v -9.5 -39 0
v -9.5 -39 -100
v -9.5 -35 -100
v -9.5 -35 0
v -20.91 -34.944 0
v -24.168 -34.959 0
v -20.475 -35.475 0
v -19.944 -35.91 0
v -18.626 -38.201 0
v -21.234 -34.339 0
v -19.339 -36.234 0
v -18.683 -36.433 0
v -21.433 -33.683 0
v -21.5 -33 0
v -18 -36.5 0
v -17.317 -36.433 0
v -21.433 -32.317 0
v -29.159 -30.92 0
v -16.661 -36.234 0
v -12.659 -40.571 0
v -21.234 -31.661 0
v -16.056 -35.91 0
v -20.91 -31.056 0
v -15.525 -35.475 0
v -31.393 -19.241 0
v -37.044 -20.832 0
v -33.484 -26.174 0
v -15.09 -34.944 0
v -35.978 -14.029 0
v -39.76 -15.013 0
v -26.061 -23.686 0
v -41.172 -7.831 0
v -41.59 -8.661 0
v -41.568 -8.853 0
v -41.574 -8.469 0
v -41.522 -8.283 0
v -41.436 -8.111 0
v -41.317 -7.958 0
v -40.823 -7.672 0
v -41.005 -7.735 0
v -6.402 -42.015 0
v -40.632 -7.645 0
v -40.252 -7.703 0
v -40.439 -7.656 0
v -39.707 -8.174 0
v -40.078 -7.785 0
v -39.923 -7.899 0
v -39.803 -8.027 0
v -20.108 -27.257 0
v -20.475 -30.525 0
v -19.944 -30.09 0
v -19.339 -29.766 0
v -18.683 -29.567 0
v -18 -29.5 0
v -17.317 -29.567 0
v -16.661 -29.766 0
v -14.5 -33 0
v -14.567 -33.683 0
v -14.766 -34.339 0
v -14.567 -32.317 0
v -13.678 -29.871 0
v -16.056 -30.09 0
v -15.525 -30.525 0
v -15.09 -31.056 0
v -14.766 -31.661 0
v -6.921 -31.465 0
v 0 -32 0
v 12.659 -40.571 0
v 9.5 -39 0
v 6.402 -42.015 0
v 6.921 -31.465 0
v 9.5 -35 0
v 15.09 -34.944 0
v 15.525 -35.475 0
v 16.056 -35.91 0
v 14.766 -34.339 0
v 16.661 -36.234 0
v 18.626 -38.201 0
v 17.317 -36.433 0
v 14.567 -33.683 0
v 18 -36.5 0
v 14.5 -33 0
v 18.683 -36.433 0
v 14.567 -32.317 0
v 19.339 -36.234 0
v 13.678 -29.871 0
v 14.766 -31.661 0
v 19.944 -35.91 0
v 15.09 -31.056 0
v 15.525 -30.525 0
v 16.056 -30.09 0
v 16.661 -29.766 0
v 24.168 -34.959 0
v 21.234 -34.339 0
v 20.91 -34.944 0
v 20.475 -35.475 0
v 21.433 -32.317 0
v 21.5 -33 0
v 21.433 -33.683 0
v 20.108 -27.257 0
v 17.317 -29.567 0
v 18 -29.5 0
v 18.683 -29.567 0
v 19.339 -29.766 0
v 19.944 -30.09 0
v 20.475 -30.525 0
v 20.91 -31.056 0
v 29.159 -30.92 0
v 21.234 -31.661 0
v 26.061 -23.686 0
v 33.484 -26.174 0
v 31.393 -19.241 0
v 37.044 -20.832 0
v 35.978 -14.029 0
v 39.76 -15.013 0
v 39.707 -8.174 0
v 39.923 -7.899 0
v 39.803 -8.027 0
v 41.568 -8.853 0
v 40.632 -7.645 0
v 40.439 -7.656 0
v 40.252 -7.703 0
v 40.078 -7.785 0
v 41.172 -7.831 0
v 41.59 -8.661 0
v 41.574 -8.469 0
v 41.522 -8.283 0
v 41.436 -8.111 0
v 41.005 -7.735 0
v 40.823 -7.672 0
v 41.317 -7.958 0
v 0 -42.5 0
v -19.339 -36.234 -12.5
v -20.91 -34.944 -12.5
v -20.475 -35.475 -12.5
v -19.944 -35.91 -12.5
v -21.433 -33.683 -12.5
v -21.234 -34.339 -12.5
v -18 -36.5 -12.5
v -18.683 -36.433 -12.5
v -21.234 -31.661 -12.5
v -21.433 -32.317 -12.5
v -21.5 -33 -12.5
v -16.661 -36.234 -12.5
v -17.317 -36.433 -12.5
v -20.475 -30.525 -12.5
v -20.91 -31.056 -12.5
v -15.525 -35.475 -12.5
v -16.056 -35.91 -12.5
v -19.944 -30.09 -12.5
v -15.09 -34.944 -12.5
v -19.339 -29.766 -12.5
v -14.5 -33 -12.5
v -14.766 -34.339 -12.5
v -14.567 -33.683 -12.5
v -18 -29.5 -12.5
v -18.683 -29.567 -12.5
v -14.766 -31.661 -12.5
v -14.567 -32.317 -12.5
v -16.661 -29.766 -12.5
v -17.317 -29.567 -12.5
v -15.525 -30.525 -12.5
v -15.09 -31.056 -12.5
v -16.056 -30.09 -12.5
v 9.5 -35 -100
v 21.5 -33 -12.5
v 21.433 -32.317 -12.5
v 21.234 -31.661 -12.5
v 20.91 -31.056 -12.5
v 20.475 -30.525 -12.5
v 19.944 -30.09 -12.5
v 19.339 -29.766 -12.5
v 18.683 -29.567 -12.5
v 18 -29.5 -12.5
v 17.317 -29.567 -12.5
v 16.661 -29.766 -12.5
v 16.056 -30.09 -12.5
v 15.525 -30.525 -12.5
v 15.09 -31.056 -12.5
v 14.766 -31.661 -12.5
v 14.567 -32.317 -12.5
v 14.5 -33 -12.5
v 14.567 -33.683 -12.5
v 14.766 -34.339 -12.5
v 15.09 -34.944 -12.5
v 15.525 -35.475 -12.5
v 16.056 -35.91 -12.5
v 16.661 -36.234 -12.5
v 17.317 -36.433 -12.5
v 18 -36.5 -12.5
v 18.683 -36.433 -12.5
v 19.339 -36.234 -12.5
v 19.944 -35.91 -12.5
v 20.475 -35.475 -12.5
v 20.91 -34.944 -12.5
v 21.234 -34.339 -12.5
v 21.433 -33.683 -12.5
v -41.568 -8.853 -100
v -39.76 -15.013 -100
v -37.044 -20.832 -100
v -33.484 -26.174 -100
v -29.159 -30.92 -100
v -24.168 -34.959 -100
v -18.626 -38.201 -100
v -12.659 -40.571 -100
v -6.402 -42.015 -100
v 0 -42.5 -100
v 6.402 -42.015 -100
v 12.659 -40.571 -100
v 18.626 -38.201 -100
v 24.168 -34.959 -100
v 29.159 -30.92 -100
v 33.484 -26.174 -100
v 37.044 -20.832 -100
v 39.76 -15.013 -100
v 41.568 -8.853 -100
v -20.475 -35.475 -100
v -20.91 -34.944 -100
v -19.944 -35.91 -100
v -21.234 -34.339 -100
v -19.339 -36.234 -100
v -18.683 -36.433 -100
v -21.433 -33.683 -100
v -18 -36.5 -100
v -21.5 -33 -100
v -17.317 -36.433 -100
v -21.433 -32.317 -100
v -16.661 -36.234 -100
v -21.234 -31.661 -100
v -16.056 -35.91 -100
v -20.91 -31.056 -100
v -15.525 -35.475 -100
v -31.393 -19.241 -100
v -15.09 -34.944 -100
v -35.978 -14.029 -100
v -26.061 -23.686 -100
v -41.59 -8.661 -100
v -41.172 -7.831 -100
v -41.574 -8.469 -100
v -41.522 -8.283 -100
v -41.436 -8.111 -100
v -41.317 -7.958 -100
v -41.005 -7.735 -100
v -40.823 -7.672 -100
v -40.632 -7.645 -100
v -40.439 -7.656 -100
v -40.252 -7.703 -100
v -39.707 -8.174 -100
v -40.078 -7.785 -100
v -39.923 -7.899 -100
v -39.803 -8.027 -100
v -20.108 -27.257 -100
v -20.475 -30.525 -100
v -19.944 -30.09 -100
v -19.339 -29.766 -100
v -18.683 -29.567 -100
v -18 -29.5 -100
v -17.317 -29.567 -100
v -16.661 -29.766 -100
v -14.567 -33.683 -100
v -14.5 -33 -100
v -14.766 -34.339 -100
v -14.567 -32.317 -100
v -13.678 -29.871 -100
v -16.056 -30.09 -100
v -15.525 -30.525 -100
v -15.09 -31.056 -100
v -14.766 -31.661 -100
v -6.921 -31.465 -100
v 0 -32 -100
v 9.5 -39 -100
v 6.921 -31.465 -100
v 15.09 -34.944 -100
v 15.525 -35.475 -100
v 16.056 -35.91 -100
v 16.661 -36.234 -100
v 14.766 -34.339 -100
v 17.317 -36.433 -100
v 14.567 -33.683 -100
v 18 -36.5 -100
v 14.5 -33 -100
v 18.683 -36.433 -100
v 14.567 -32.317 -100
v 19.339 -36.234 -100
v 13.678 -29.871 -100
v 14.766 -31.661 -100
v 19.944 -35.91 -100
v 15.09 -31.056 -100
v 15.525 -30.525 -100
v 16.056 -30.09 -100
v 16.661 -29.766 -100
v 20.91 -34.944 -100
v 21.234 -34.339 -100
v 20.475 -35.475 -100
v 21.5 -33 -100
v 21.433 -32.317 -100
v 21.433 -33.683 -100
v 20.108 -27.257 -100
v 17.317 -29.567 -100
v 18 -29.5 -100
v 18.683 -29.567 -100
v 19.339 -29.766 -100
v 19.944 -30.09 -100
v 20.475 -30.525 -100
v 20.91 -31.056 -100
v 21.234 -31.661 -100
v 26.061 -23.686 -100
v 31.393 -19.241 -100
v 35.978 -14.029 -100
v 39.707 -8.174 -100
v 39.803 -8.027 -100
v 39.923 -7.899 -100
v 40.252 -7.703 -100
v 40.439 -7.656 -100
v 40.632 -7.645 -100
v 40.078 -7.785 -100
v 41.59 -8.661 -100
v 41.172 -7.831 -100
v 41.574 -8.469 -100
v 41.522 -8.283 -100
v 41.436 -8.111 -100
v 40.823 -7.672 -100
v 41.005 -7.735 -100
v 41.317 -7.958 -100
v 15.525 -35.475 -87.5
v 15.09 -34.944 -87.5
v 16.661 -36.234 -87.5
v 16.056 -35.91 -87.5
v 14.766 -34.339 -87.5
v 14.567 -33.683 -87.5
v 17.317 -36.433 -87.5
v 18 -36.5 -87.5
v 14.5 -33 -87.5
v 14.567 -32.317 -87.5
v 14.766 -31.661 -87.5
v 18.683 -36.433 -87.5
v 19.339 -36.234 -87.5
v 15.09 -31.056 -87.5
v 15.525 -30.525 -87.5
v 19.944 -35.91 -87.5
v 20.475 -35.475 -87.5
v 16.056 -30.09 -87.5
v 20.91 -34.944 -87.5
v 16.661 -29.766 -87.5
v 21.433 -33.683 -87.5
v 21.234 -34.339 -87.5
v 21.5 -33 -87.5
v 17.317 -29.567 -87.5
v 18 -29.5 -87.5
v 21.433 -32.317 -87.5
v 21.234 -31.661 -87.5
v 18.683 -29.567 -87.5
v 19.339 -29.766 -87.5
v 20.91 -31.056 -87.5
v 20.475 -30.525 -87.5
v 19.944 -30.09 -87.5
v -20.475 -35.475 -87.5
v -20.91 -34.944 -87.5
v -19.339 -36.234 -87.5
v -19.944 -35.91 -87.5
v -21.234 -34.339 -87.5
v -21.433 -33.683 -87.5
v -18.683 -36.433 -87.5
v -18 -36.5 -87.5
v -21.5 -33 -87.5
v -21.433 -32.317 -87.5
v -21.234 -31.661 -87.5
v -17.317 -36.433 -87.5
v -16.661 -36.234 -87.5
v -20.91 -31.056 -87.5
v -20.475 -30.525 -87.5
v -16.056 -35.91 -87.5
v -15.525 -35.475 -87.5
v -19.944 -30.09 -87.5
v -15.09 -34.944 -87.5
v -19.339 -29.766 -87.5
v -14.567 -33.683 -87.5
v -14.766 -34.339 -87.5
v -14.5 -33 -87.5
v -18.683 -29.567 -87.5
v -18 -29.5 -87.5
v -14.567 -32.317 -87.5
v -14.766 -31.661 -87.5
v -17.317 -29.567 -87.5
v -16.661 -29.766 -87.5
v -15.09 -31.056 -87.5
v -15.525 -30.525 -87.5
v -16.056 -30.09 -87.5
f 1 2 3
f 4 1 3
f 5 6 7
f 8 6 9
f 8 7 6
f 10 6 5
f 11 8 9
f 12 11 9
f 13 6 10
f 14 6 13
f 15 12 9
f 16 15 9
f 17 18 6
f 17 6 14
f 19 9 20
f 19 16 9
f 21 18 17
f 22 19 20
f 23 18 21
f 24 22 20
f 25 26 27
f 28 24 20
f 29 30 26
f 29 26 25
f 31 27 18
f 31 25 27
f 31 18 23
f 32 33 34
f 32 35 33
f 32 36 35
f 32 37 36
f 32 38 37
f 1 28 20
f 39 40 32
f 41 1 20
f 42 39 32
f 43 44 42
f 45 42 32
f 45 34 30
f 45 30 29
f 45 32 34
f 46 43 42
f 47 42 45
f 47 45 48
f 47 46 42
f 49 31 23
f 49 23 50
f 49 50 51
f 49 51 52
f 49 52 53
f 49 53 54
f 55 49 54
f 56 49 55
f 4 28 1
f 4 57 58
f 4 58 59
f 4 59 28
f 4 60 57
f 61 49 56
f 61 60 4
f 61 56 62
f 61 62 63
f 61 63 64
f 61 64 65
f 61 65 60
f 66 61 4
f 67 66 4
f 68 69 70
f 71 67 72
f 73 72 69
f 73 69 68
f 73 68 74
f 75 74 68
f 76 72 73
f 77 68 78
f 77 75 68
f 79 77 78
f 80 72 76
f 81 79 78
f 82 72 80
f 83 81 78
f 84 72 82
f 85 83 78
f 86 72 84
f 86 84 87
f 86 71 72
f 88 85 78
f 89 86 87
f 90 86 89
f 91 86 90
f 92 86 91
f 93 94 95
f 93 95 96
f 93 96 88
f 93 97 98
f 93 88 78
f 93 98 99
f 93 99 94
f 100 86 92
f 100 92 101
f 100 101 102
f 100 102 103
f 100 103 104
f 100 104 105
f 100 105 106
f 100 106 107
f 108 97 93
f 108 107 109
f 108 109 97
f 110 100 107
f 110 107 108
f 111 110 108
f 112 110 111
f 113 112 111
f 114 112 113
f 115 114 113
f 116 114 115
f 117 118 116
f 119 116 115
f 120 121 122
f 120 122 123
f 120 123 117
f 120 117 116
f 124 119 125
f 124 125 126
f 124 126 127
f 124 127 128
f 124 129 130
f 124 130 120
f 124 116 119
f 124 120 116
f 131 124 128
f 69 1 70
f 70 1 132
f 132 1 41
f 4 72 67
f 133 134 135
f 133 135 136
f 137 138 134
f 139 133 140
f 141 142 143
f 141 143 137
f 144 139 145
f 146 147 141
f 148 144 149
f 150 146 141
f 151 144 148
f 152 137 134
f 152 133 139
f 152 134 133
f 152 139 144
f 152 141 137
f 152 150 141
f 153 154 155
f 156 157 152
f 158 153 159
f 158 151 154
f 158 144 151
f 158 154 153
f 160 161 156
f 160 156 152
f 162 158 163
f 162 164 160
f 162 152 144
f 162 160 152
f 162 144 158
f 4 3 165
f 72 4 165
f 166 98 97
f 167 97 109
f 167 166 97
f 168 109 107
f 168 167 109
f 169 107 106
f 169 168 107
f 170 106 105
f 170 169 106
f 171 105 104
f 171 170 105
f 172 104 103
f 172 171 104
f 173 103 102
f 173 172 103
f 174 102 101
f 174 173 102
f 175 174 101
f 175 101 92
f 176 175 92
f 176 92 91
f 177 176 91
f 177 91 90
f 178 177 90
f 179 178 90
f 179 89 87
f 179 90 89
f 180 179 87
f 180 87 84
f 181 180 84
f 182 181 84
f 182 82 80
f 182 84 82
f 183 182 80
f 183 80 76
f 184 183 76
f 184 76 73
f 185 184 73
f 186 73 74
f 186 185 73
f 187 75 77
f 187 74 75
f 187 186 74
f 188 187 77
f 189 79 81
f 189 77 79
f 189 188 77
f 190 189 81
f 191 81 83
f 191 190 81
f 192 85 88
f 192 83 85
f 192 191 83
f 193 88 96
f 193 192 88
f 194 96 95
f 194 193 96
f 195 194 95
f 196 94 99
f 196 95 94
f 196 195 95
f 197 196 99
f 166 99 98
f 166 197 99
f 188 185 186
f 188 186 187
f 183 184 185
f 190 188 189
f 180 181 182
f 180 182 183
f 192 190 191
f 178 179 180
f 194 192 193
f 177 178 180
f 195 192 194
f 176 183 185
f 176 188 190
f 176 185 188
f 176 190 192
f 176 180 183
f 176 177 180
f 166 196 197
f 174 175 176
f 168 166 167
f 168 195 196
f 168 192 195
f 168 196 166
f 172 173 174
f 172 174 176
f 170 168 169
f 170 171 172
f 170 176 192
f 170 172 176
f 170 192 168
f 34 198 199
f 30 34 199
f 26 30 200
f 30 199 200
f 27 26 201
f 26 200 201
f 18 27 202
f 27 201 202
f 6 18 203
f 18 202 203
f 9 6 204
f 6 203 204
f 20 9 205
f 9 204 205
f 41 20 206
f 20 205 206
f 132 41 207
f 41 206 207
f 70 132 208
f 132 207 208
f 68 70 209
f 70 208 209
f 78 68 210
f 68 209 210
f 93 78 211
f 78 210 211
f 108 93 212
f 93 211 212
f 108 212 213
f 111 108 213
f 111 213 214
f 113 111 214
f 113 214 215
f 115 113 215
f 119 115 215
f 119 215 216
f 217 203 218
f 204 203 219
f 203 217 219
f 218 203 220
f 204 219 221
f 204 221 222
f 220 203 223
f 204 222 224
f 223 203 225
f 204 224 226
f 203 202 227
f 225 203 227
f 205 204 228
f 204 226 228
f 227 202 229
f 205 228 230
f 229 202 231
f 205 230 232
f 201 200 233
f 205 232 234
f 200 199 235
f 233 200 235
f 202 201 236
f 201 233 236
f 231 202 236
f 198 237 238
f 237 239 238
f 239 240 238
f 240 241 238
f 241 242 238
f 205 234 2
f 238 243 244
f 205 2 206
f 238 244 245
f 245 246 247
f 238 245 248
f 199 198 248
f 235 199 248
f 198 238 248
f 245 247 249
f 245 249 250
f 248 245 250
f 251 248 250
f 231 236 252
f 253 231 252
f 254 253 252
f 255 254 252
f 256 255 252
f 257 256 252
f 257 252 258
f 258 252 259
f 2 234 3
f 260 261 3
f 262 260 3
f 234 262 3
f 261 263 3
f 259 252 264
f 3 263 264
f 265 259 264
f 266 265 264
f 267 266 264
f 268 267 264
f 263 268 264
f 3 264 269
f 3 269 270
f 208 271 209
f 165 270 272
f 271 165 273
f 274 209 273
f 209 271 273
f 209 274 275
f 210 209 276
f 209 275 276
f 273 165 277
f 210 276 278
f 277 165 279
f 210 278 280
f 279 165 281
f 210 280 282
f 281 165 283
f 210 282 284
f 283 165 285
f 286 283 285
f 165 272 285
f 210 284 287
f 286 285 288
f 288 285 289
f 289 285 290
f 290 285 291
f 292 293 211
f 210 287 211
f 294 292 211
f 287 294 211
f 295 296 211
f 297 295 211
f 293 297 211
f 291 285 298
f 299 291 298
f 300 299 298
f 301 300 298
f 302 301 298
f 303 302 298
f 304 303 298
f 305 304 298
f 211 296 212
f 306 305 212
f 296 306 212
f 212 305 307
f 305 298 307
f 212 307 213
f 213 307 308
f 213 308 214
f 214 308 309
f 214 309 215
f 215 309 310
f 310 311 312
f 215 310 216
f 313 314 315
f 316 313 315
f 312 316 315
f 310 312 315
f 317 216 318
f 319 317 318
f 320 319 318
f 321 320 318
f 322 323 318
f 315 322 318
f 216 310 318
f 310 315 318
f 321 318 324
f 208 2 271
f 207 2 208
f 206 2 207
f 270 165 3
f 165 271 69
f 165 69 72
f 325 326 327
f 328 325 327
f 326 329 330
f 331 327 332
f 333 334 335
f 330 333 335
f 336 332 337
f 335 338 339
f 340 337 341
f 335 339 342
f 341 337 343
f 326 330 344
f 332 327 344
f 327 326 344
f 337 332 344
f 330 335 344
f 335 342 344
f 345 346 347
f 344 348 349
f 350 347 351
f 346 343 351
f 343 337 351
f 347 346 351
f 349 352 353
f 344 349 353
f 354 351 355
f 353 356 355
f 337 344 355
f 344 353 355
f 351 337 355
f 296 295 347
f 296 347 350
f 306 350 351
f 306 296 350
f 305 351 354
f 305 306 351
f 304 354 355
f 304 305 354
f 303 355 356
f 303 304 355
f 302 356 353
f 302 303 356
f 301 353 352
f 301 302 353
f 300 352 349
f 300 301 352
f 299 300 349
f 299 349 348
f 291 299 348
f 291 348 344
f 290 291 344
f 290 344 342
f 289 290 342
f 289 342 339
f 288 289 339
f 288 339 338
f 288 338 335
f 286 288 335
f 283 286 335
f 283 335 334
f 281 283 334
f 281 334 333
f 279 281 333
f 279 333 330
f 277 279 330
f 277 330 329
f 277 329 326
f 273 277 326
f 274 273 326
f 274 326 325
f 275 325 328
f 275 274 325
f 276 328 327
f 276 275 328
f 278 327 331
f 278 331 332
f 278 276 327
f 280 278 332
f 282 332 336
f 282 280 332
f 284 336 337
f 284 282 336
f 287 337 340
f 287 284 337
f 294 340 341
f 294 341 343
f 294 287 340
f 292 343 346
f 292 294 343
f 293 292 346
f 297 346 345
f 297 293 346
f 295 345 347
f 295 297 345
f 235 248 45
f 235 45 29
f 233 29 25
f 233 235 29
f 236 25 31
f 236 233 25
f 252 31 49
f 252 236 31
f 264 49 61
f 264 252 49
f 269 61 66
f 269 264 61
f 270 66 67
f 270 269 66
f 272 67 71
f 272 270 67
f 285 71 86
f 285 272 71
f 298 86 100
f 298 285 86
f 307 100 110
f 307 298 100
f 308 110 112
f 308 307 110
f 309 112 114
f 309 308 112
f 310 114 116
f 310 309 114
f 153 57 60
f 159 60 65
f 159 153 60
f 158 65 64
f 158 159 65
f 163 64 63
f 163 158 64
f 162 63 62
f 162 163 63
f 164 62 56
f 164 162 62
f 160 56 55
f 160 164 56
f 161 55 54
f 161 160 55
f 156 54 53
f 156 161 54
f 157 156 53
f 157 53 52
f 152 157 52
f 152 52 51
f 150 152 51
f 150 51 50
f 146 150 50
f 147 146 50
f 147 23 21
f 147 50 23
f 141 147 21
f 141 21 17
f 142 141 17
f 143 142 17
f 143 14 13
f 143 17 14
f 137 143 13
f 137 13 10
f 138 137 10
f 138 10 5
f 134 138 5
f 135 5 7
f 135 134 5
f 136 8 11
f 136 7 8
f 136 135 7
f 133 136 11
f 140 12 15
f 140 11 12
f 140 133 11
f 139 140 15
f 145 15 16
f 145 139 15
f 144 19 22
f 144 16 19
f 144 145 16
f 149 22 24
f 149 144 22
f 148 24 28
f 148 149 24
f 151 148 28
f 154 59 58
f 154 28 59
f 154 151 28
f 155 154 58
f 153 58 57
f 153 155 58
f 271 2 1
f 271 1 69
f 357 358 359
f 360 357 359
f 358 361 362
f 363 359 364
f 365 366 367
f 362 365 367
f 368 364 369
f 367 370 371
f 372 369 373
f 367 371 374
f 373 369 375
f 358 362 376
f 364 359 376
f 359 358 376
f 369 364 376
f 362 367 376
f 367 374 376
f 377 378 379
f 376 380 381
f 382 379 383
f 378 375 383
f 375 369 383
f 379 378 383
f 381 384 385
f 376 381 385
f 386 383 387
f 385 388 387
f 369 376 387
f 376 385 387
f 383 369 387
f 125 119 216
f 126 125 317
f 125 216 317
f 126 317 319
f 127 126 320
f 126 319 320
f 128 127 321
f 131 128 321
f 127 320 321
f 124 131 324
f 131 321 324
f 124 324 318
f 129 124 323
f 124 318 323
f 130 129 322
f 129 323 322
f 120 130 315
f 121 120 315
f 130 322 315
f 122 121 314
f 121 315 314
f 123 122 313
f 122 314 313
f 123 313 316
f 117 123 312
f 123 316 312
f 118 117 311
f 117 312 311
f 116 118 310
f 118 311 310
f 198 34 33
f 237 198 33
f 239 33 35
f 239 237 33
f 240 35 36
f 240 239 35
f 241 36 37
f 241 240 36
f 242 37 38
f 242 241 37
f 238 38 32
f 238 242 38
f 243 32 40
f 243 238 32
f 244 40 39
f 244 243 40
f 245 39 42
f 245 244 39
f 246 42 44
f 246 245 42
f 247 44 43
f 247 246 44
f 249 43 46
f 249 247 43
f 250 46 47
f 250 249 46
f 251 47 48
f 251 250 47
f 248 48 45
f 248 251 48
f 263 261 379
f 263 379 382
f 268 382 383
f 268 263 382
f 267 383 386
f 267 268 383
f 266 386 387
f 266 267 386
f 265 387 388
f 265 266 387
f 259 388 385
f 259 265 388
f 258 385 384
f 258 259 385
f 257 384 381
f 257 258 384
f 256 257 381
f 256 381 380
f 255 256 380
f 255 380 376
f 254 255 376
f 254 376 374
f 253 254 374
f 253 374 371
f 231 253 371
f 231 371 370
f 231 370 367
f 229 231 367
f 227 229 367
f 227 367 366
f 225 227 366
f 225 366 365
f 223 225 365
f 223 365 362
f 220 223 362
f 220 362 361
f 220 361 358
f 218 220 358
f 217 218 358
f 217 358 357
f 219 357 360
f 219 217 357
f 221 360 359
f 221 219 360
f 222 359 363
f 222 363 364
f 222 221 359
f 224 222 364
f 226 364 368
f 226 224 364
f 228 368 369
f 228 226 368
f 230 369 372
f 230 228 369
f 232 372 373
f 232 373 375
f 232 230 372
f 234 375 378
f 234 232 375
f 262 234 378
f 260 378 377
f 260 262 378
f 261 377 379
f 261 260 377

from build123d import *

# Parameters (mm, degrees)
CYLINDER017_R     = 3.5
CYLINDER017_DEPTH = 25
CYLINDER016_R     = 3.5
CYLINDER016_DEPTH = 25
CYLINDER009_R     = 3.5
CYLINDER009_DEPTH = 25
CYLINDER007_R     = 3.5
CYLINDER007_DEPTH = 25
BOX001_W          = 19
BOX001_H          = 4
BOX001_DEPTH      = 100
CYLINDER002_R     = 45
CYLINDER002_DEPTH = 100
CYLINDER003_R     = 42.5
CYLINDER003_DEPTH = 100
FILLET003_R       = 1
FILLET002_R       = 1


with BuildPart() as cylindre015:
    # Cylinder017 → Cylinder017 (new body)
    with BuildSketch(Plane(origin=(18, -33, -112.5), x_dir=(1, 0, 0), z_dir=(0, 0, 1))):
        Circle(CYLINDER017_R)
    extrude(amount=CYLINDER017_DEPTH)


with BuildPart() as cylindre014:
    # Cylinder016 → Cylinder016 (new body)
    with BuildSketch(Plane(origin=(-18, -33, -112.5), x_dir=(1, 0, 0), z_dir=(0, 0, 1))):
        Circle(CYLINDER016_R)
    extrude(amount=CYLINDER016_DEPTH)


with BuildPart() as cylindre009:
    # Cylinder009 → Cylinder009 (new body)
    with BuildSketch(Plane(origin=(18, -33, -12.5), x_dir=(1, 0, 0), z_dir=(0, 0, 1))):
        Circle(CYLINDER009_R)
    extrude(amount=CYLINDER009_DEPTH)


with BuildPart() as cylindre007:
    # Cylinder007 → Cylinder007 (new body)
    with BuildSketch(Plane(origin=(-18, -33, -12.5), x_dir=(1, 0, 0), z_dir=(0, 0, 1))):
        Circle(CYLINDER007_R)
    extrude(amount=CYLINDER007_DEPTH)


with BuildPart() as cube001:
    # Box001 → Box001 (new body)
    with BuildSketch(Plane(origin=(-9.5, -39, 0), x_dir=(1, 0, 0), z_dir=(0, 0, 1))):
        with Locations((9.5, 2)):
            Rectangle(BOX001_W, BOX001_H)
    extrude(amount=BOX001_DEPTH)


with BuildPart() as cylindre002:
    # Cylinder002 → Cylinder002 (new body)
    with BuildSketch(Plane(origin=(0, 13, 0), x_dir=(1, 0, 0), z_dir=(0, 0, 1))):
        Circle(CYLINDER002_R)
    extrude(amount=CYLINDER002_DEPTH)


with BuildPart() as cut011:
    # Cylinder003 → Cylinder003 (new body)
    with BuildSketch(Plane.XY):
        Circle(CYLINDER003_R)
    extrude(amount=CYLINDER003_DEPTH)

    # Cut003: cut Cylindre002
    add(cylindre002.part, mode=Mode.SUBTRACT)

    # Fillet003
    fillet003_edges = [cut011.edges().sort_by_distance(p)[0] for p in [
        (-42.456904, -1.913462, 50),
    ]]
    fillet(fillet003_edges, radius=FILLET003_R)

    # Fillet002
    fillet002_edges = [cut011.edges().sort_by_distance(p)[0] for p in [
        (42.456904, -1.913462, 50),
    ]]
    fillet(fillet002_edges, radius=FILLET002_R)

    # Cut002: cut Cube001
    add(cube001.part, mode=Mode.SUBTRACT)


with BuildPart() as cut011_1:
    # Cut002 placement: moved
    add(cut011.part.moved(Location((0, 0, -100))))

    # Cut007: cut Cylindre007
    add(cylindre007.part, mode=Mode.SUBTRACT)

    # Cut008: cut Cylindre009
    add(cylindre009.part, mode=Mode.SUBTRACT)

    # Cut010: cut Cylindre014
    add(cylindre014.part, mode=Mode.SUBTRACT)

    # Cut011: cut Cylindre015
    add(cylindre015.part, mode=Mode.SUBTRACT)


solid = cut011_1.part
